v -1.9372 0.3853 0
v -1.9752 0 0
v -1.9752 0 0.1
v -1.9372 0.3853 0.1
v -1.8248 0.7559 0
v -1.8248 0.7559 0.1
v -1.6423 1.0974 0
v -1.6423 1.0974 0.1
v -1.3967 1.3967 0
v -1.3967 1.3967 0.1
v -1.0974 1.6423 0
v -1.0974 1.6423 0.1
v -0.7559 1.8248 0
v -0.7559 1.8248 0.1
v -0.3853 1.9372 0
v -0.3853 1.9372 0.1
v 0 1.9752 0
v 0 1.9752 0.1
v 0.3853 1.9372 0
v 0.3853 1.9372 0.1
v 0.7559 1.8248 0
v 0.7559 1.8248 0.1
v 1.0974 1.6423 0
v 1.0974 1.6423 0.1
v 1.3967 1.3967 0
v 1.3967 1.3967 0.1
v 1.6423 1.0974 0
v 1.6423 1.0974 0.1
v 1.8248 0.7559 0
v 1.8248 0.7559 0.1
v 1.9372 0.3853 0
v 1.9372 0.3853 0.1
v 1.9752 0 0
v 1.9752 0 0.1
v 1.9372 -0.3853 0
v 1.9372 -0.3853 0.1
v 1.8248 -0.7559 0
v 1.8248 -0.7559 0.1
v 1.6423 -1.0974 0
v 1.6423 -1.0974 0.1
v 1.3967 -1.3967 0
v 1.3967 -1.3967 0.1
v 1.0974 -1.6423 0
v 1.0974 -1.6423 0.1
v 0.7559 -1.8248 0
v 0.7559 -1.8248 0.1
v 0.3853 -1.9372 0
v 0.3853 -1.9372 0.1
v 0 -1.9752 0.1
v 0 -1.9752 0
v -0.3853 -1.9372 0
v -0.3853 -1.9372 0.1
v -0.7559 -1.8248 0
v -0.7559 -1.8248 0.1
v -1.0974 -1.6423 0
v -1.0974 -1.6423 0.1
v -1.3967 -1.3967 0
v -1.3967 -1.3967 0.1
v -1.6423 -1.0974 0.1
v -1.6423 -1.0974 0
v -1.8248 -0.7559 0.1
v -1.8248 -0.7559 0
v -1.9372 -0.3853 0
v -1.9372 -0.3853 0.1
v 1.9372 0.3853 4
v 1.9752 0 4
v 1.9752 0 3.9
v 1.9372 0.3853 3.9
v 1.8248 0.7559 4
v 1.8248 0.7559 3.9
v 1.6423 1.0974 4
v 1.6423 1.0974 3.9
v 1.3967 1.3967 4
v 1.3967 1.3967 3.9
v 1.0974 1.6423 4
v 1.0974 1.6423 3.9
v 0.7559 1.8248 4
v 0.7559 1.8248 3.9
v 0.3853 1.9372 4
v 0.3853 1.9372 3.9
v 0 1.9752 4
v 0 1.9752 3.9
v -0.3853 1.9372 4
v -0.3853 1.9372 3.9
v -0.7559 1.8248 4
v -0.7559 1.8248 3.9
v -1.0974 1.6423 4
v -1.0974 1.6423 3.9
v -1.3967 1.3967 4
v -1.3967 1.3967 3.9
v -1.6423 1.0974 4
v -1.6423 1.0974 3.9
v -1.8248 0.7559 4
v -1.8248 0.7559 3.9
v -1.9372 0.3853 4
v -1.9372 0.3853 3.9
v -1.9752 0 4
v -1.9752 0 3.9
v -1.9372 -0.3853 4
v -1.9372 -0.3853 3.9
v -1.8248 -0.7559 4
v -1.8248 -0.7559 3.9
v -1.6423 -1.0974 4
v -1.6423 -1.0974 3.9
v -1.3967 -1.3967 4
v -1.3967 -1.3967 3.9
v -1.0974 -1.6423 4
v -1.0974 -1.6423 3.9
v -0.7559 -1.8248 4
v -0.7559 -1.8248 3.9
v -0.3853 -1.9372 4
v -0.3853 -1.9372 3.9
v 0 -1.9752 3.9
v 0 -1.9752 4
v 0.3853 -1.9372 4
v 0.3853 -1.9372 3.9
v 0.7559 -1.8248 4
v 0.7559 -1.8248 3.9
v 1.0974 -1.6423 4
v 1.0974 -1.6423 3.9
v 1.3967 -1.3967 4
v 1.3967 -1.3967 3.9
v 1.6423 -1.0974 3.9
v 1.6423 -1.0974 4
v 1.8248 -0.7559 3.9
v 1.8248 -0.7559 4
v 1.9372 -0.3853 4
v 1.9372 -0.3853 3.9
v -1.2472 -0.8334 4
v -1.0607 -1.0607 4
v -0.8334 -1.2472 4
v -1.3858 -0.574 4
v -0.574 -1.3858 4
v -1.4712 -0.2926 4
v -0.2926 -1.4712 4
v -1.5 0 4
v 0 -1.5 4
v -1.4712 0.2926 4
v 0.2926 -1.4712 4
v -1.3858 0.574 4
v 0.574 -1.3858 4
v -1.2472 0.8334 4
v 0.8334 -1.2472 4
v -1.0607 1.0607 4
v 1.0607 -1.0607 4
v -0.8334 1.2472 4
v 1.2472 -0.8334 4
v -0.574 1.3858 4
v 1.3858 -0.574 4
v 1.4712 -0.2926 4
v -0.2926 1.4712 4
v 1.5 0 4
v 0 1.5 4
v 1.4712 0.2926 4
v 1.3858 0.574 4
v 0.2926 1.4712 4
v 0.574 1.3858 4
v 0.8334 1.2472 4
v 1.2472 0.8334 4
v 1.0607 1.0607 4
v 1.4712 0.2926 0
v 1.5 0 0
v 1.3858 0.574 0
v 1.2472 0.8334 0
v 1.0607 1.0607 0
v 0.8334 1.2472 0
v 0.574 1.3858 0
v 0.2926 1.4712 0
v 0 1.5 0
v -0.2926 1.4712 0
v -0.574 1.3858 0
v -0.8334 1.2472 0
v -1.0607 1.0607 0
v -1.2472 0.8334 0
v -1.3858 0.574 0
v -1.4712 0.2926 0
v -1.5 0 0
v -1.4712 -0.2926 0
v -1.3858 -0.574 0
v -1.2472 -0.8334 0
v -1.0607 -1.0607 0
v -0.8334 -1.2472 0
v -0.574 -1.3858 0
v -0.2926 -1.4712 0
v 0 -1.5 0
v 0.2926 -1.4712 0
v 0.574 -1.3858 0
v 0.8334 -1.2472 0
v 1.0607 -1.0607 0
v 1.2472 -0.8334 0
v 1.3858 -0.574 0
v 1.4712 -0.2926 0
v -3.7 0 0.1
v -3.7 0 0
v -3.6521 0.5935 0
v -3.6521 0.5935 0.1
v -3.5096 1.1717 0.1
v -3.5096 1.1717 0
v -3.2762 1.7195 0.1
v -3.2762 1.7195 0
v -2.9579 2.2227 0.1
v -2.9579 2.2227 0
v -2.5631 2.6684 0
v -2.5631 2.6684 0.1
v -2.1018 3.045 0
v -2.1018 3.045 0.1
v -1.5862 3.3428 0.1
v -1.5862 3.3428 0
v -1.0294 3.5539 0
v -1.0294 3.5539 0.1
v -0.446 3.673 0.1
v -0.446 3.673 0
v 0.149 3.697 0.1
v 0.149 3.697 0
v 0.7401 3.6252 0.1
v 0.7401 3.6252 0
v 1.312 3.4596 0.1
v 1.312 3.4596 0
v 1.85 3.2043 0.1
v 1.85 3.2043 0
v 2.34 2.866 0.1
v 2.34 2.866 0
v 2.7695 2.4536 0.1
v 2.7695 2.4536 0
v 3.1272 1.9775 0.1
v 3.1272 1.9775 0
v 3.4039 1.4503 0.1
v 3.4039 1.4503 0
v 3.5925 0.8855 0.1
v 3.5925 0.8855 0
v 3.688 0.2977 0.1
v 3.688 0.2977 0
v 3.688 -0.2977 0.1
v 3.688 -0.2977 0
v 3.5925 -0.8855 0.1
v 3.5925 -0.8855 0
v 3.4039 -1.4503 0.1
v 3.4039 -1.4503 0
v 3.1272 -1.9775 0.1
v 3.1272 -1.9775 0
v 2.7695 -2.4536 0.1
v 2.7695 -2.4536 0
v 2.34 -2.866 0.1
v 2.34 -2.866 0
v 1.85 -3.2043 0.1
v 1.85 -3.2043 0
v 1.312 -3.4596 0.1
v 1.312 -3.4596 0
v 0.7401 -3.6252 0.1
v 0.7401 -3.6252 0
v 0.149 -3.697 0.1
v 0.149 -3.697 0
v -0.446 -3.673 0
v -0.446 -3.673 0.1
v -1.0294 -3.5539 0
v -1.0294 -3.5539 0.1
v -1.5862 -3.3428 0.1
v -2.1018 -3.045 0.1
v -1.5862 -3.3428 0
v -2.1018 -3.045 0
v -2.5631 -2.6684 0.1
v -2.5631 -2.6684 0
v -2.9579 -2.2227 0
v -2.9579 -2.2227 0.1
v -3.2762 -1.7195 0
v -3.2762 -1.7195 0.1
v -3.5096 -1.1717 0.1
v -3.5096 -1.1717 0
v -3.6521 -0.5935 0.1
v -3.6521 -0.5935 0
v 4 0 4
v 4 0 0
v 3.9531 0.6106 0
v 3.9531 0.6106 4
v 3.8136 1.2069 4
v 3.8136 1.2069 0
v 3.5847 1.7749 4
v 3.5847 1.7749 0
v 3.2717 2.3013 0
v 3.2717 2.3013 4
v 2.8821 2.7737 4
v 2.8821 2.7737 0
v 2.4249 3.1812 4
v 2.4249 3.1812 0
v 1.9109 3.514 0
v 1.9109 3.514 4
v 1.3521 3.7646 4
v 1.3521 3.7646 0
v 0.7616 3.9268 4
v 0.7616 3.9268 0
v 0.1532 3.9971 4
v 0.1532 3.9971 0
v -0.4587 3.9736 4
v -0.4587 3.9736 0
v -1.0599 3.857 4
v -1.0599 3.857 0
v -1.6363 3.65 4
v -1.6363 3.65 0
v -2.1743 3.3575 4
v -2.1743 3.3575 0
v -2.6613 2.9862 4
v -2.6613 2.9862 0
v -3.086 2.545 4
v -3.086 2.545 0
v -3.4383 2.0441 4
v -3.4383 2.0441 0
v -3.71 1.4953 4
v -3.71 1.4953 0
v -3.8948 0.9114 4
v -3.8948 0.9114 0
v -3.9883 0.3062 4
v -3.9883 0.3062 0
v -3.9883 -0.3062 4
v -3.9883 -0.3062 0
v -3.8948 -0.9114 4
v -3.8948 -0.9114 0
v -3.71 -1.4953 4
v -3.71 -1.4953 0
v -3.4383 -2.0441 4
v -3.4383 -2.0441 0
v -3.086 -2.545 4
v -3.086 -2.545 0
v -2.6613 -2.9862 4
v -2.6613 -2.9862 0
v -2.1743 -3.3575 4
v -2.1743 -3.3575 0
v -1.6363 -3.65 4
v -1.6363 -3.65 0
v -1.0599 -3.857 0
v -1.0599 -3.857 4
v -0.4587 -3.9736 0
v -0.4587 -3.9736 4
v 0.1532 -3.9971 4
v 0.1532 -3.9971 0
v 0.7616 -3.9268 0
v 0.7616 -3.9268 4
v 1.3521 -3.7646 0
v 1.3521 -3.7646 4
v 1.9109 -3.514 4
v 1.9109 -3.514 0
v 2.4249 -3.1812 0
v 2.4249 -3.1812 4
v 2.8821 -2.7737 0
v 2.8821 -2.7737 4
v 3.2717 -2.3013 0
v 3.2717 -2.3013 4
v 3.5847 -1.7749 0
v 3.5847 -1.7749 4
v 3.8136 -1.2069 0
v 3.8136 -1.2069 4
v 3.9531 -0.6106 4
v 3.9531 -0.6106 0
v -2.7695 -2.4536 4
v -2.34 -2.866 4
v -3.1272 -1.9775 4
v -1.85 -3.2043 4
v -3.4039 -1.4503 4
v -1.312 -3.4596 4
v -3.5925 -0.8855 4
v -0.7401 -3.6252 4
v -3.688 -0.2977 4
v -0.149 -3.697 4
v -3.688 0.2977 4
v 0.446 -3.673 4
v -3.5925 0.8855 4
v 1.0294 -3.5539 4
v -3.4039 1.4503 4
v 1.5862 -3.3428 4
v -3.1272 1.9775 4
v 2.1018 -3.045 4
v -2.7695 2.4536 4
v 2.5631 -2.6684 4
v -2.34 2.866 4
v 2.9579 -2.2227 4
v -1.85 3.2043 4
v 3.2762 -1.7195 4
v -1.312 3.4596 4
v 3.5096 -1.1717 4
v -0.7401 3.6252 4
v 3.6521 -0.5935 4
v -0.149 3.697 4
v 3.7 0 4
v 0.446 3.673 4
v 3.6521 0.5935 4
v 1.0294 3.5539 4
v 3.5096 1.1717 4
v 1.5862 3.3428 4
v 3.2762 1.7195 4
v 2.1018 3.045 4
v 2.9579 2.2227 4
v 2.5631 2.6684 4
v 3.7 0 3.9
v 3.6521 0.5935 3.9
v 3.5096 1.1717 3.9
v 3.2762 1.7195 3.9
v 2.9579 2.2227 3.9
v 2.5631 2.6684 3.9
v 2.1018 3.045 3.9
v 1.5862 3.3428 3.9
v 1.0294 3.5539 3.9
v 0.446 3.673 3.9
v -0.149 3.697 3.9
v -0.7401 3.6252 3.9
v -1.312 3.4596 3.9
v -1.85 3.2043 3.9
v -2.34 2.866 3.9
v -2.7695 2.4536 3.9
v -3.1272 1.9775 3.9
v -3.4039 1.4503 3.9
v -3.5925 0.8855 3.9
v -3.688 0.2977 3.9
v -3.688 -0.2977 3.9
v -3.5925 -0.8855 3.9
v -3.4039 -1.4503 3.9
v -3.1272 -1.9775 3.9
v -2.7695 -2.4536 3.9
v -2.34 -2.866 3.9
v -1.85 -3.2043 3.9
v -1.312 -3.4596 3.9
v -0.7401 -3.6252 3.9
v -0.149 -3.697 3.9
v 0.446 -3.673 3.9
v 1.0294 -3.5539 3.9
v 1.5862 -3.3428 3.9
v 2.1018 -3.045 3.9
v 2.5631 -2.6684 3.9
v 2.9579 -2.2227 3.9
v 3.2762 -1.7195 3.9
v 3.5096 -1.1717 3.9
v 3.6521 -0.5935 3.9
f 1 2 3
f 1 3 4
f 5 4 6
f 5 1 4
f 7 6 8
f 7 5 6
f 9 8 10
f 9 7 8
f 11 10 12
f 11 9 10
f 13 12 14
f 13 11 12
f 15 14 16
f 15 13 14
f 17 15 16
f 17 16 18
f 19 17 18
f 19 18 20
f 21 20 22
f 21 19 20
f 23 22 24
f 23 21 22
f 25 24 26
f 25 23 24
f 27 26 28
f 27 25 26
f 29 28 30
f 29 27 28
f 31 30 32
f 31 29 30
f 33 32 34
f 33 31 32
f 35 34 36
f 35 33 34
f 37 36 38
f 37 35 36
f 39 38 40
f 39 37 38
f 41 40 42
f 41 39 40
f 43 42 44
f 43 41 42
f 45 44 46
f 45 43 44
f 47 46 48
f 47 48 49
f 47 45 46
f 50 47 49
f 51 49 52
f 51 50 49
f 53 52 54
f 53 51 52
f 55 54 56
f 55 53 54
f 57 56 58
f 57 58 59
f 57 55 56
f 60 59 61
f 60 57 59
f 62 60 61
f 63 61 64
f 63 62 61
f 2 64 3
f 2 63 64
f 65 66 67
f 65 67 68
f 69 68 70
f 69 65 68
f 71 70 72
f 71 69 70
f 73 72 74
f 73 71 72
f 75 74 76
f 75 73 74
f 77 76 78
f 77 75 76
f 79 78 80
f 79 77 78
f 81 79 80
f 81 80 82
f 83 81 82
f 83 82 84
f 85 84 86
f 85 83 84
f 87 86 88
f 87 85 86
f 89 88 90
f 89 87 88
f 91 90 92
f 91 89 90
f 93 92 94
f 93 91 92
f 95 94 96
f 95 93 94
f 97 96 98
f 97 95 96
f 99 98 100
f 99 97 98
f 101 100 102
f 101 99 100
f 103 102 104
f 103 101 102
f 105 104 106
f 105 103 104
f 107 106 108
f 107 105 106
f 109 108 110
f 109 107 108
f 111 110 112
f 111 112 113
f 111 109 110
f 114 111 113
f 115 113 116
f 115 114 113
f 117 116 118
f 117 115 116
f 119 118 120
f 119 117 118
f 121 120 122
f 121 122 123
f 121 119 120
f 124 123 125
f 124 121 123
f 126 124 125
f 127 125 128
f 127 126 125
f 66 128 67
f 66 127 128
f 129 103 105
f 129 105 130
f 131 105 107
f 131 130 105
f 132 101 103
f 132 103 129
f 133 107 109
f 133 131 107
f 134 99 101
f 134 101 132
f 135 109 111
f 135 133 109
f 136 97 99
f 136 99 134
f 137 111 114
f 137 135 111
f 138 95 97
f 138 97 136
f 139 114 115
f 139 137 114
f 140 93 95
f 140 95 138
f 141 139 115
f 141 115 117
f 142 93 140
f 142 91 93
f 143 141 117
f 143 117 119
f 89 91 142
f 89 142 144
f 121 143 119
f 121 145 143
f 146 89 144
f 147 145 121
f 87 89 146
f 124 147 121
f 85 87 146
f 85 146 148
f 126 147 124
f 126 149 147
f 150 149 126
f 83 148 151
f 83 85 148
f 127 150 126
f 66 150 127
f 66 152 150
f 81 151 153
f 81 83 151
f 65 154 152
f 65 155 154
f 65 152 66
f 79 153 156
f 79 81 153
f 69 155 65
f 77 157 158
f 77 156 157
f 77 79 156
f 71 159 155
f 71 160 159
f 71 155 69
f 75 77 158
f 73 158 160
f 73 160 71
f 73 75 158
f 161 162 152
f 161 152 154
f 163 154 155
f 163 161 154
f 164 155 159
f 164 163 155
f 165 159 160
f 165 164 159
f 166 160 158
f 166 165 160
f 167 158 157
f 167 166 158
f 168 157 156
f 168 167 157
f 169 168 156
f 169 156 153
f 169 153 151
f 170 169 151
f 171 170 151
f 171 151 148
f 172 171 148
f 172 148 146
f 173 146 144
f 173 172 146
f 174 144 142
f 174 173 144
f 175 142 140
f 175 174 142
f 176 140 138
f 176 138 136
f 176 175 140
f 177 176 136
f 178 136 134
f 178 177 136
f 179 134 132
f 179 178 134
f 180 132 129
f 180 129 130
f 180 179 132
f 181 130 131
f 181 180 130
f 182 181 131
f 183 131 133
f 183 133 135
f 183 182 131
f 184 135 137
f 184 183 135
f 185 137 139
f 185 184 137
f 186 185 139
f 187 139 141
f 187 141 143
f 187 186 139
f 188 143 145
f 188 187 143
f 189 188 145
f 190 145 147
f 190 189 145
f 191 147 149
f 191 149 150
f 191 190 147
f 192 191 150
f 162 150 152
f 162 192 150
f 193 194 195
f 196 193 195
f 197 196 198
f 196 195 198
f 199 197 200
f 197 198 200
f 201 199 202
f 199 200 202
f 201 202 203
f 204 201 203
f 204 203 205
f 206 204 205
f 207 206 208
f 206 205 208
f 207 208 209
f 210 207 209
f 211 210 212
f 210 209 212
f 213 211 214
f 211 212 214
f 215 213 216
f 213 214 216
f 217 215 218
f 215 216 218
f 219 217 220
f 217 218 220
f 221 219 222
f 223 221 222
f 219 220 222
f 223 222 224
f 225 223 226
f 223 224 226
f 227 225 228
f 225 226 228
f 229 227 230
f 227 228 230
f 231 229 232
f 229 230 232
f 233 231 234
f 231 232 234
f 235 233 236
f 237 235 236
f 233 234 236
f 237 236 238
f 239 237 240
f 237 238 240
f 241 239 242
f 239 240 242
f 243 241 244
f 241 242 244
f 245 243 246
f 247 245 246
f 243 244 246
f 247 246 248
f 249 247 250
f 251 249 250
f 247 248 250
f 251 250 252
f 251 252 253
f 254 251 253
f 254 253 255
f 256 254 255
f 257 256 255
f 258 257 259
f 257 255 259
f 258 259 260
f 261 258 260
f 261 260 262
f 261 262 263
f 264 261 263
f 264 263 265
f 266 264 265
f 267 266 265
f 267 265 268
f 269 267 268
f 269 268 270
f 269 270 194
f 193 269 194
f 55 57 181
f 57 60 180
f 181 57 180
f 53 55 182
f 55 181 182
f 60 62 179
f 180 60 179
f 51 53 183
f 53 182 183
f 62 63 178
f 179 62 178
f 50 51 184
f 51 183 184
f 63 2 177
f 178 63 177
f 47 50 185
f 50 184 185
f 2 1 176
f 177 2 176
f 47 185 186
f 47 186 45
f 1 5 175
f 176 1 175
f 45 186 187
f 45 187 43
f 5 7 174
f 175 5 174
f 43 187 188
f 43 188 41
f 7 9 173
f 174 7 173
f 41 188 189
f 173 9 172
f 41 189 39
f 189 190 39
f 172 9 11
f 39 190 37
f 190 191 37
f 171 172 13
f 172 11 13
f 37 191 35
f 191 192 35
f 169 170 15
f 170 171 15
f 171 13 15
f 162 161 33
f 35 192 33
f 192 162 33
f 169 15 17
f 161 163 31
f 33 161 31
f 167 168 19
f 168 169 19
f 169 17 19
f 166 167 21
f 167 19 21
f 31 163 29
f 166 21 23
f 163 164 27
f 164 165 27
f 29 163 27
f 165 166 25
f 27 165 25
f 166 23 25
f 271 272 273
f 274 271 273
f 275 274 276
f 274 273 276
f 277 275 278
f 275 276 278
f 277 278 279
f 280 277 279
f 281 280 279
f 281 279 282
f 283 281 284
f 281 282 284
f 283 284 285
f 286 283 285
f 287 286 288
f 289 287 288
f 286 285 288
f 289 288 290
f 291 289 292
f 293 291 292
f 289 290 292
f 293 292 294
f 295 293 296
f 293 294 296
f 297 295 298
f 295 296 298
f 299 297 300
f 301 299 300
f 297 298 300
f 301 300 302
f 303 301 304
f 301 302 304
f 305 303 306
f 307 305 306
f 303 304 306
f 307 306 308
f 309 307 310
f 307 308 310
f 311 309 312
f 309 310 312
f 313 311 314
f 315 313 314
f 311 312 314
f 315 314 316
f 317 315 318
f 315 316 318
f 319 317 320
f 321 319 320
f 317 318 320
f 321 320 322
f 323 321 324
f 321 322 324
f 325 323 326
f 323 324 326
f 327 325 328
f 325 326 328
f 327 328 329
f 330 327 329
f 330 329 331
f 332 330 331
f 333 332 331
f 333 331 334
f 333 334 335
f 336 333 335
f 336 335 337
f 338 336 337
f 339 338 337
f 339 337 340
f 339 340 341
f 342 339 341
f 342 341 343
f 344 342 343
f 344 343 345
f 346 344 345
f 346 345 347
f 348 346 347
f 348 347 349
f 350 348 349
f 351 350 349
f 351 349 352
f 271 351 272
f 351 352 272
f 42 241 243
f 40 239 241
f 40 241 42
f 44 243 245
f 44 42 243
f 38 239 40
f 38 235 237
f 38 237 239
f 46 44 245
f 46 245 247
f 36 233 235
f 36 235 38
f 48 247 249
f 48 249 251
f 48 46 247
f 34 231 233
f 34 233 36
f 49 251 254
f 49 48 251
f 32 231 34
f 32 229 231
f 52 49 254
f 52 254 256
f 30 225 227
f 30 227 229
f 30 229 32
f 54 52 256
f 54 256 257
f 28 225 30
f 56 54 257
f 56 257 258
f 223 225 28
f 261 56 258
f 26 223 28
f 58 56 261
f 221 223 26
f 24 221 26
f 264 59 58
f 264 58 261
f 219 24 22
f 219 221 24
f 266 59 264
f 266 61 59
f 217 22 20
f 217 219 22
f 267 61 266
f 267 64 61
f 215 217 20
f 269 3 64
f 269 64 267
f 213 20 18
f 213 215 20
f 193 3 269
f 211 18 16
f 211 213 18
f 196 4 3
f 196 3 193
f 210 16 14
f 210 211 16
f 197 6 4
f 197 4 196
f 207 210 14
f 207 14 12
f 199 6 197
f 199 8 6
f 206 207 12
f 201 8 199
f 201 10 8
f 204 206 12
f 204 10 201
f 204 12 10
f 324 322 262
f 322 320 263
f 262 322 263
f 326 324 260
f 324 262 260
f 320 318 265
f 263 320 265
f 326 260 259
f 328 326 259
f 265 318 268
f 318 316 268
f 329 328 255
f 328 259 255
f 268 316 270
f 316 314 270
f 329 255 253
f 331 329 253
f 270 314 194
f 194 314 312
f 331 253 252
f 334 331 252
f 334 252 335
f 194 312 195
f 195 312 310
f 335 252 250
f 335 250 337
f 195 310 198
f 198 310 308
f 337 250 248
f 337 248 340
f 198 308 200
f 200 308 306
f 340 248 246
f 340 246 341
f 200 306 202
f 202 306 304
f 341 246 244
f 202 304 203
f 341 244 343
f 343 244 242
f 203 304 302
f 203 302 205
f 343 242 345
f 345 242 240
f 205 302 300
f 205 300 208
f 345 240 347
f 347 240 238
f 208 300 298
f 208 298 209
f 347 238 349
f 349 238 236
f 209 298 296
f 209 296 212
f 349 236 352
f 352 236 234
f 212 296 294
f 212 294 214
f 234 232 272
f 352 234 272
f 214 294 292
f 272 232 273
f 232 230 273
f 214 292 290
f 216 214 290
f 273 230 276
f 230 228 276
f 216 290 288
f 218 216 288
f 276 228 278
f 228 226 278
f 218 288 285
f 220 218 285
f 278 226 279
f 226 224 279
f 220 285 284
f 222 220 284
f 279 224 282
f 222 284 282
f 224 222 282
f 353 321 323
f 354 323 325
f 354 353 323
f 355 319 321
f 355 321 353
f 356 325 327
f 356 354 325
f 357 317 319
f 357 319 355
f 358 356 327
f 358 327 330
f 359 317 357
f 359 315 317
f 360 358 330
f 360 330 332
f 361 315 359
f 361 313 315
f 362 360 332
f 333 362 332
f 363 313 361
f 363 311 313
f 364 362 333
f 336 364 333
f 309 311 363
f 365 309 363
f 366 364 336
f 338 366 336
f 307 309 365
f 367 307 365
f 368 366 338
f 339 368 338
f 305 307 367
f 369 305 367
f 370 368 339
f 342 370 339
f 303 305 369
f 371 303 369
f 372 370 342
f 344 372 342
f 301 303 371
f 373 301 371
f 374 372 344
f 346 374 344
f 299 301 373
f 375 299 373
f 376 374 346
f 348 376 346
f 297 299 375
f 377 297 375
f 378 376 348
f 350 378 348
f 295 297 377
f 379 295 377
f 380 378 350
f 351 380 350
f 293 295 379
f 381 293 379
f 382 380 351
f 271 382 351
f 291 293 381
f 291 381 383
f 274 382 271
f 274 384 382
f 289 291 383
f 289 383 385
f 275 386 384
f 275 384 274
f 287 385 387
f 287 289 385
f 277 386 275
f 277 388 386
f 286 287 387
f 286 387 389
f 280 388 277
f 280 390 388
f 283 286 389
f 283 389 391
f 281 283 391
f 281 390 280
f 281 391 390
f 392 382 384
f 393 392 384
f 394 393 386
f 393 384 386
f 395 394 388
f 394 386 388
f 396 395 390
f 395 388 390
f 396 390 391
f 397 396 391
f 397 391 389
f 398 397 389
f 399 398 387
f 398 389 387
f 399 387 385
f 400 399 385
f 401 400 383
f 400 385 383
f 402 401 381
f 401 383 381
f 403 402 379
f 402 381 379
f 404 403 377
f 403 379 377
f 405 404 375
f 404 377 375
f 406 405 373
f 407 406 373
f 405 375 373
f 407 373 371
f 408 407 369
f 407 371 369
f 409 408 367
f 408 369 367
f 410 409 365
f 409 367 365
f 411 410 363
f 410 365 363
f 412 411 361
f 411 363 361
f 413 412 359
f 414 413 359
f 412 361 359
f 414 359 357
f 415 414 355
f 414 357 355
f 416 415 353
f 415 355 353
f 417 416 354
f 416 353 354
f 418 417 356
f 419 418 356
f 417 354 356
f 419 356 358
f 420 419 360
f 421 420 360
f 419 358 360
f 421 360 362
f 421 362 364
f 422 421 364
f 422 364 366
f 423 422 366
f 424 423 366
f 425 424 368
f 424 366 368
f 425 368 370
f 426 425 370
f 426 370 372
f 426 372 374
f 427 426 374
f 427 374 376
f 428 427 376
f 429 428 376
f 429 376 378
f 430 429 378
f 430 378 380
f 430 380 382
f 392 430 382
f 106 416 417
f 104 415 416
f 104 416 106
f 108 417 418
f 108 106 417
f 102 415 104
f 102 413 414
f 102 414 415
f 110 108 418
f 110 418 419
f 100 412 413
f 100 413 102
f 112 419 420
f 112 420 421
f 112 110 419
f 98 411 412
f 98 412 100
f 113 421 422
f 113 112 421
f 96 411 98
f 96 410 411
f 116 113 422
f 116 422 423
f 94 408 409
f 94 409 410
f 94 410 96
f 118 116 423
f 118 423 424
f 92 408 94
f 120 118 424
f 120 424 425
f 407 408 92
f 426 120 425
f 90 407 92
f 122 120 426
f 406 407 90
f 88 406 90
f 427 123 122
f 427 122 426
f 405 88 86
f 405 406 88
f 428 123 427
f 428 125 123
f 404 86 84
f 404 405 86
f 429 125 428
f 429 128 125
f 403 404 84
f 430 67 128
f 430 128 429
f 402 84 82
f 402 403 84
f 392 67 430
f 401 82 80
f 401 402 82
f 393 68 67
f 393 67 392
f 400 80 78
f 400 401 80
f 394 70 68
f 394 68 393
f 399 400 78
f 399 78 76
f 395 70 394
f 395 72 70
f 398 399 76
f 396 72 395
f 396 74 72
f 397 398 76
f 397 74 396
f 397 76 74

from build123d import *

# Parameters (mm, degrees)
SKETCH1_R           = 4
SKETCH1_R_2         = 1.5
BOSS_EXTRUDE1_DEPTH = 4
SKETCH2_R           = 3.7
SKETCH2_R_2         = 1.975178003
CUT_EXTRUDE1_DEPTH  = 0.1
SKETCH3_R           = 3.7
SKETCH3_R_2         = 1.975178003
CUT_EXTRUDE2_DEPTH  = 0.1


with BuildPart() as part:
    # Sketch1 → Boss-Extrude1 (new body)
    with BuildSketch(Plane.XY):
        Circle(SKETCH1_R)
        Circle(SKETCH1_R_2, mode=Mode.SUBTRACT)
    extrude(amount=BOSS_EXTRUDE1_DEPTH)

    # Sketch2 → Cut-Extrude1 (cut)
    with BuildSketch(Plane.XY.offset(4)):
        Circle(SKETCH2_R)
        Circle(SKETCH2_R_2, mode=Mode.SUBTRACT)
    extrude(amount=-CUT_EXTRUDE1_DEPTH, mode=Mode.SUBTRACT)

    # Sketch3 → Cut-Extrude2 (cut)
    with BuildSketch(Plane(origin=(0, 0, 0), x_dir=(-1, 0, 0), z_dir=(0, 0, -1))):
        Circle(SKETCH3_R)
        Circle(SKETCH3_R_2, mode=Mode.SUBTRACT)
    extrude(amount=-CUT_EXTRUDE2_DEPTH, mode=Mode.SUBTRACT)


solid = part.part
